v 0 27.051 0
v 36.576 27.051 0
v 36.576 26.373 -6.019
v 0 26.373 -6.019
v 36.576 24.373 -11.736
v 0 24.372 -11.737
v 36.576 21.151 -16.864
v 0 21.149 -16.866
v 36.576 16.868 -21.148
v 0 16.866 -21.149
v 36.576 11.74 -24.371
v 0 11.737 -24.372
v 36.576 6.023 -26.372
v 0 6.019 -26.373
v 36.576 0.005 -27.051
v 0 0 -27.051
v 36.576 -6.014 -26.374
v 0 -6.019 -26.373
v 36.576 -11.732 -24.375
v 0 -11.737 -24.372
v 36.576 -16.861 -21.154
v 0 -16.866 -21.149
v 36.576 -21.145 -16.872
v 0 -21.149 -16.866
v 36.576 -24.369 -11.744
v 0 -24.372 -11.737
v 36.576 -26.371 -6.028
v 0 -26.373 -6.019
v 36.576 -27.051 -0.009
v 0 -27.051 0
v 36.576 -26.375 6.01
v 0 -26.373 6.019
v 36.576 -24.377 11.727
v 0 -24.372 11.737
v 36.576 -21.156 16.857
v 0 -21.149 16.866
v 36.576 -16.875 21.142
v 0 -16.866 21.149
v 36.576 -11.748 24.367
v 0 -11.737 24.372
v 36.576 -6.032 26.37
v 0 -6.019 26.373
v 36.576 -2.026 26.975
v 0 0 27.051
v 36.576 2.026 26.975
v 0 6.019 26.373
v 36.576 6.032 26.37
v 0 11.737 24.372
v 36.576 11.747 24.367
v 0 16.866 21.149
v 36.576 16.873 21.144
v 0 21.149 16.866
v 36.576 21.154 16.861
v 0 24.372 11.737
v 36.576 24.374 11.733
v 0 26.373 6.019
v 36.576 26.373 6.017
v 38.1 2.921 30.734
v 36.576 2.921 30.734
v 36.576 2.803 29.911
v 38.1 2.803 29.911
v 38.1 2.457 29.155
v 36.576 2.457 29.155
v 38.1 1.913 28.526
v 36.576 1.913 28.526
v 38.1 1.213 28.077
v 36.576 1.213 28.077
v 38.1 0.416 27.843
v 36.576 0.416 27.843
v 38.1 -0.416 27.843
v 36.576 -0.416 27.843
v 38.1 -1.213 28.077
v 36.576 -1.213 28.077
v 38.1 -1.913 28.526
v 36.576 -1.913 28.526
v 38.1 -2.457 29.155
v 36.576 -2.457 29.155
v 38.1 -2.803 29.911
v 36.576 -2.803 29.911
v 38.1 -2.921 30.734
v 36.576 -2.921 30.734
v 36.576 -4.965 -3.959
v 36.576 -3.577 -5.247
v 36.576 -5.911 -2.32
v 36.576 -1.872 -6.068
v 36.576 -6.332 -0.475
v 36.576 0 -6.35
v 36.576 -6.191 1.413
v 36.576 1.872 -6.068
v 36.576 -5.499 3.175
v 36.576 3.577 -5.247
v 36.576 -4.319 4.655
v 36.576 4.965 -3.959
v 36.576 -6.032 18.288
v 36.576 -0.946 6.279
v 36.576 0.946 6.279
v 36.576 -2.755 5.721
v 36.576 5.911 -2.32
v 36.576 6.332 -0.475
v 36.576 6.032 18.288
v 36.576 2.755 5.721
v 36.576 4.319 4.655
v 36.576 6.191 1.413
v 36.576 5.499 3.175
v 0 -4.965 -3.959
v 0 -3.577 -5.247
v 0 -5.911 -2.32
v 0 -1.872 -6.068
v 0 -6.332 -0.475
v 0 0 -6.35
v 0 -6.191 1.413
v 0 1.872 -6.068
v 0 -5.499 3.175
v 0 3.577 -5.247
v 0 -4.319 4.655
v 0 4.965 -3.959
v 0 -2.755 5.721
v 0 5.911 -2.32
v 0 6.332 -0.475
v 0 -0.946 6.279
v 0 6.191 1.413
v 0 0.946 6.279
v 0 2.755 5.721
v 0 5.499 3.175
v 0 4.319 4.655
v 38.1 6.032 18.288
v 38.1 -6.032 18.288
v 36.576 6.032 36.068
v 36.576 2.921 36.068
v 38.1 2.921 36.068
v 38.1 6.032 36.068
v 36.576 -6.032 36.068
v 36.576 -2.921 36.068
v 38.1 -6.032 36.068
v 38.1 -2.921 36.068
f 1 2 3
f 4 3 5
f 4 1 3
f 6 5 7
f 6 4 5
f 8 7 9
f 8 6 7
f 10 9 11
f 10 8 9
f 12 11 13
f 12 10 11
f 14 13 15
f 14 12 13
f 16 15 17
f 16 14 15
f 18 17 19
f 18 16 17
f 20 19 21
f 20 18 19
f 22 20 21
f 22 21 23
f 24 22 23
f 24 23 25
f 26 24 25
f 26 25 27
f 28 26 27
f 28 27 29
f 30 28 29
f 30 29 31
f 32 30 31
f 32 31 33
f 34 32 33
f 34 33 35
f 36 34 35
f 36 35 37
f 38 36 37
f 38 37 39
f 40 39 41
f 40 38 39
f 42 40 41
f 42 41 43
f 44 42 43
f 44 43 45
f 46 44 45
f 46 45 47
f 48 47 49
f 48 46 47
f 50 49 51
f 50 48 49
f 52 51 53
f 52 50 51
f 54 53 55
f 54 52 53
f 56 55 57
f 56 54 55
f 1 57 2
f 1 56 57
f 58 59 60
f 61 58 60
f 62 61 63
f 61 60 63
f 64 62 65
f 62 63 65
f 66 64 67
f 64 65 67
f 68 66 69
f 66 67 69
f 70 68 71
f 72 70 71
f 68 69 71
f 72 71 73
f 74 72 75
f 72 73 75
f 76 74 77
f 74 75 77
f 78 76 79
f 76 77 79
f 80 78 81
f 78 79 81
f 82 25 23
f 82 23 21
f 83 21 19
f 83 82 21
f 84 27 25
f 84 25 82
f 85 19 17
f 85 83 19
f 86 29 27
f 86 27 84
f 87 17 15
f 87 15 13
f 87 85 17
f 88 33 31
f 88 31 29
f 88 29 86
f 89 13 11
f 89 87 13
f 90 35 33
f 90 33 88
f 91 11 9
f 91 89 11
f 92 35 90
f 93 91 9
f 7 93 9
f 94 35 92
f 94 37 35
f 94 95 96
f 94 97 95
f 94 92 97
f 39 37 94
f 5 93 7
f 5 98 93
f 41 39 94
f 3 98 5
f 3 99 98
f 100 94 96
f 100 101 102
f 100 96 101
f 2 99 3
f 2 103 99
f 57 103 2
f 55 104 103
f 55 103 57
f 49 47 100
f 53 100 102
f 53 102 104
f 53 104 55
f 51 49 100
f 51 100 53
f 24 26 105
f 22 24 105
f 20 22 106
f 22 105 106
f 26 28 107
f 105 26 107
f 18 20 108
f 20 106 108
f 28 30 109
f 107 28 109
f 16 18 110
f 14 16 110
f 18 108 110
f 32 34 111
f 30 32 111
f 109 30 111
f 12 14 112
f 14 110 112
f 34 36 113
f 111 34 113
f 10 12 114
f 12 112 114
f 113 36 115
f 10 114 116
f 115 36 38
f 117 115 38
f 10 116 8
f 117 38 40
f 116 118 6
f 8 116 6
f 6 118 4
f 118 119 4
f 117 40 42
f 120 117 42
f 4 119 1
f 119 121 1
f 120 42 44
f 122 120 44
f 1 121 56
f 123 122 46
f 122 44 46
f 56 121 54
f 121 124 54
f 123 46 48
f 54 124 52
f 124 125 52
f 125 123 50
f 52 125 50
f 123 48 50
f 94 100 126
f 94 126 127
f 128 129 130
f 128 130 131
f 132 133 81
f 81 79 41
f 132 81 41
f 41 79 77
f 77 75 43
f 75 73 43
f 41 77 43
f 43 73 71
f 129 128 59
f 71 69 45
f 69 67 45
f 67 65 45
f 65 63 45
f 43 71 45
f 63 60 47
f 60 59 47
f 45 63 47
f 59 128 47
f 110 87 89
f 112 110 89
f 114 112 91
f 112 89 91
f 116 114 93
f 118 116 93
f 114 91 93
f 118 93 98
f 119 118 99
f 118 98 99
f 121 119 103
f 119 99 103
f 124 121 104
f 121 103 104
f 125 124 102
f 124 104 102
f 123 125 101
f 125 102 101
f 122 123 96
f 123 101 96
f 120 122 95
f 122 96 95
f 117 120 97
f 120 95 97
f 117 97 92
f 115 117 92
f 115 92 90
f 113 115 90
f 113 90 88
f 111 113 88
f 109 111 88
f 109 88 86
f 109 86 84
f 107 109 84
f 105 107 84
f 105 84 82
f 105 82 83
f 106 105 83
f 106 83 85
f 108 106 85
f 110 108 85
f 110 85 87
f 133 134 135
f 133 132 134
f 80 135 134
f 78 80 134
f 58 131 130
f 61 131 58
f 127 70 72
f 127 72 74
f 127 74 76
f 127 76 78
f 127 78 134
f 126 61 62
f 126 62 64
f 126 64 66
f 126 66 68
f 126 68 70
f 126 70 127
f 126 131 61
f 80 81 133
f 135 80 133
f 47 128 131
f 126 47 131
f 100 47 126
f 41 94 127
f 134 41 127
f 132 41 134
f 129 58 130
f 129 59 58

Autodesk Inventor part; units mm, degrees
ref_plane "YZ Plane" through (0, 0, 0) normal (1, 0, 0) x (0, 1, 0)
ref_plane "XZ Plane" through (0, 0, 0) normal (0, 1, 0) x (-1, 0, 0)
ref_plane "XY Plane" through (0, 0, 0) normal (0, 0, 1) x (1, 0, 0)
sketch "Sketch1" plane through (0, 0, 0) normal (1, 0, 0) x (0, 1, 0)
  circle A0 centre (0, 0) radius 27.051
  dimension "d0" = 54.102
extrude "Extrusion1" add sketch "Sketch1" along normal blind 36.576
sketch "Sketch2" plane through (36.576, 0, 0) normal (1, 0, 0) x (0, 0, -1)
  circle A0 centre (0, 0) radius 6.35
  dimension "d3" = 12.7
extrude "Extrusion2" cut sketch "Sketch2" against normal through all
sketch "Sketch3" plane through (36.576, 0, 0) normal (1, 0, 0) x (0, 0, -1)
  circle A0 centre (0, 0) radius 6.35 projected
  circle A1 centre (0, 0) radius 27.051 projected
  line L0 (0, 0) -> (-36.068, 0) construction
  line L1 (-18.288, -6.0325) -> (-36.068, -6.0325)
  line L2 (-36.068, -6.0325) -> (-36.068, 6.0325)
  line L3 (-36.068, 6.0325) -> (-18.288, 6.0325)
  line L4 (-18.288, 6.0325) -> (-18.288, -6.0325)
  line L5 (-18.288, -6.0325) -> (-36.068, 6.0325) construction
  line L6 (-36.068, -6.0325) -> (-18.288, 6.0325) construction
  circle A2 centre (-30.734, 0) radius 2.921
  line L7 (-30.734, 2.921) -> (-36.068, 2.921)
  line L8 (-30.734, -2.921) -> (-36.068, -2.921)
  point P0 (-27.178, 0)
  dimension "d6" = 27.178
  dimension "d7" = 12.065
  dimension "d8" = 17.78
  dimension "d9" = 5.842
  dimension "d10" = 5.334
extrude "Extrusion3" add sketch "Sketch3" along normal blind 1.524 contours L3 L4 L1 A1 | A1 L1 L2 L8 A2 L7 L3 picked at (-21.1837, 0.6753)
properties part number "SlipRing"
